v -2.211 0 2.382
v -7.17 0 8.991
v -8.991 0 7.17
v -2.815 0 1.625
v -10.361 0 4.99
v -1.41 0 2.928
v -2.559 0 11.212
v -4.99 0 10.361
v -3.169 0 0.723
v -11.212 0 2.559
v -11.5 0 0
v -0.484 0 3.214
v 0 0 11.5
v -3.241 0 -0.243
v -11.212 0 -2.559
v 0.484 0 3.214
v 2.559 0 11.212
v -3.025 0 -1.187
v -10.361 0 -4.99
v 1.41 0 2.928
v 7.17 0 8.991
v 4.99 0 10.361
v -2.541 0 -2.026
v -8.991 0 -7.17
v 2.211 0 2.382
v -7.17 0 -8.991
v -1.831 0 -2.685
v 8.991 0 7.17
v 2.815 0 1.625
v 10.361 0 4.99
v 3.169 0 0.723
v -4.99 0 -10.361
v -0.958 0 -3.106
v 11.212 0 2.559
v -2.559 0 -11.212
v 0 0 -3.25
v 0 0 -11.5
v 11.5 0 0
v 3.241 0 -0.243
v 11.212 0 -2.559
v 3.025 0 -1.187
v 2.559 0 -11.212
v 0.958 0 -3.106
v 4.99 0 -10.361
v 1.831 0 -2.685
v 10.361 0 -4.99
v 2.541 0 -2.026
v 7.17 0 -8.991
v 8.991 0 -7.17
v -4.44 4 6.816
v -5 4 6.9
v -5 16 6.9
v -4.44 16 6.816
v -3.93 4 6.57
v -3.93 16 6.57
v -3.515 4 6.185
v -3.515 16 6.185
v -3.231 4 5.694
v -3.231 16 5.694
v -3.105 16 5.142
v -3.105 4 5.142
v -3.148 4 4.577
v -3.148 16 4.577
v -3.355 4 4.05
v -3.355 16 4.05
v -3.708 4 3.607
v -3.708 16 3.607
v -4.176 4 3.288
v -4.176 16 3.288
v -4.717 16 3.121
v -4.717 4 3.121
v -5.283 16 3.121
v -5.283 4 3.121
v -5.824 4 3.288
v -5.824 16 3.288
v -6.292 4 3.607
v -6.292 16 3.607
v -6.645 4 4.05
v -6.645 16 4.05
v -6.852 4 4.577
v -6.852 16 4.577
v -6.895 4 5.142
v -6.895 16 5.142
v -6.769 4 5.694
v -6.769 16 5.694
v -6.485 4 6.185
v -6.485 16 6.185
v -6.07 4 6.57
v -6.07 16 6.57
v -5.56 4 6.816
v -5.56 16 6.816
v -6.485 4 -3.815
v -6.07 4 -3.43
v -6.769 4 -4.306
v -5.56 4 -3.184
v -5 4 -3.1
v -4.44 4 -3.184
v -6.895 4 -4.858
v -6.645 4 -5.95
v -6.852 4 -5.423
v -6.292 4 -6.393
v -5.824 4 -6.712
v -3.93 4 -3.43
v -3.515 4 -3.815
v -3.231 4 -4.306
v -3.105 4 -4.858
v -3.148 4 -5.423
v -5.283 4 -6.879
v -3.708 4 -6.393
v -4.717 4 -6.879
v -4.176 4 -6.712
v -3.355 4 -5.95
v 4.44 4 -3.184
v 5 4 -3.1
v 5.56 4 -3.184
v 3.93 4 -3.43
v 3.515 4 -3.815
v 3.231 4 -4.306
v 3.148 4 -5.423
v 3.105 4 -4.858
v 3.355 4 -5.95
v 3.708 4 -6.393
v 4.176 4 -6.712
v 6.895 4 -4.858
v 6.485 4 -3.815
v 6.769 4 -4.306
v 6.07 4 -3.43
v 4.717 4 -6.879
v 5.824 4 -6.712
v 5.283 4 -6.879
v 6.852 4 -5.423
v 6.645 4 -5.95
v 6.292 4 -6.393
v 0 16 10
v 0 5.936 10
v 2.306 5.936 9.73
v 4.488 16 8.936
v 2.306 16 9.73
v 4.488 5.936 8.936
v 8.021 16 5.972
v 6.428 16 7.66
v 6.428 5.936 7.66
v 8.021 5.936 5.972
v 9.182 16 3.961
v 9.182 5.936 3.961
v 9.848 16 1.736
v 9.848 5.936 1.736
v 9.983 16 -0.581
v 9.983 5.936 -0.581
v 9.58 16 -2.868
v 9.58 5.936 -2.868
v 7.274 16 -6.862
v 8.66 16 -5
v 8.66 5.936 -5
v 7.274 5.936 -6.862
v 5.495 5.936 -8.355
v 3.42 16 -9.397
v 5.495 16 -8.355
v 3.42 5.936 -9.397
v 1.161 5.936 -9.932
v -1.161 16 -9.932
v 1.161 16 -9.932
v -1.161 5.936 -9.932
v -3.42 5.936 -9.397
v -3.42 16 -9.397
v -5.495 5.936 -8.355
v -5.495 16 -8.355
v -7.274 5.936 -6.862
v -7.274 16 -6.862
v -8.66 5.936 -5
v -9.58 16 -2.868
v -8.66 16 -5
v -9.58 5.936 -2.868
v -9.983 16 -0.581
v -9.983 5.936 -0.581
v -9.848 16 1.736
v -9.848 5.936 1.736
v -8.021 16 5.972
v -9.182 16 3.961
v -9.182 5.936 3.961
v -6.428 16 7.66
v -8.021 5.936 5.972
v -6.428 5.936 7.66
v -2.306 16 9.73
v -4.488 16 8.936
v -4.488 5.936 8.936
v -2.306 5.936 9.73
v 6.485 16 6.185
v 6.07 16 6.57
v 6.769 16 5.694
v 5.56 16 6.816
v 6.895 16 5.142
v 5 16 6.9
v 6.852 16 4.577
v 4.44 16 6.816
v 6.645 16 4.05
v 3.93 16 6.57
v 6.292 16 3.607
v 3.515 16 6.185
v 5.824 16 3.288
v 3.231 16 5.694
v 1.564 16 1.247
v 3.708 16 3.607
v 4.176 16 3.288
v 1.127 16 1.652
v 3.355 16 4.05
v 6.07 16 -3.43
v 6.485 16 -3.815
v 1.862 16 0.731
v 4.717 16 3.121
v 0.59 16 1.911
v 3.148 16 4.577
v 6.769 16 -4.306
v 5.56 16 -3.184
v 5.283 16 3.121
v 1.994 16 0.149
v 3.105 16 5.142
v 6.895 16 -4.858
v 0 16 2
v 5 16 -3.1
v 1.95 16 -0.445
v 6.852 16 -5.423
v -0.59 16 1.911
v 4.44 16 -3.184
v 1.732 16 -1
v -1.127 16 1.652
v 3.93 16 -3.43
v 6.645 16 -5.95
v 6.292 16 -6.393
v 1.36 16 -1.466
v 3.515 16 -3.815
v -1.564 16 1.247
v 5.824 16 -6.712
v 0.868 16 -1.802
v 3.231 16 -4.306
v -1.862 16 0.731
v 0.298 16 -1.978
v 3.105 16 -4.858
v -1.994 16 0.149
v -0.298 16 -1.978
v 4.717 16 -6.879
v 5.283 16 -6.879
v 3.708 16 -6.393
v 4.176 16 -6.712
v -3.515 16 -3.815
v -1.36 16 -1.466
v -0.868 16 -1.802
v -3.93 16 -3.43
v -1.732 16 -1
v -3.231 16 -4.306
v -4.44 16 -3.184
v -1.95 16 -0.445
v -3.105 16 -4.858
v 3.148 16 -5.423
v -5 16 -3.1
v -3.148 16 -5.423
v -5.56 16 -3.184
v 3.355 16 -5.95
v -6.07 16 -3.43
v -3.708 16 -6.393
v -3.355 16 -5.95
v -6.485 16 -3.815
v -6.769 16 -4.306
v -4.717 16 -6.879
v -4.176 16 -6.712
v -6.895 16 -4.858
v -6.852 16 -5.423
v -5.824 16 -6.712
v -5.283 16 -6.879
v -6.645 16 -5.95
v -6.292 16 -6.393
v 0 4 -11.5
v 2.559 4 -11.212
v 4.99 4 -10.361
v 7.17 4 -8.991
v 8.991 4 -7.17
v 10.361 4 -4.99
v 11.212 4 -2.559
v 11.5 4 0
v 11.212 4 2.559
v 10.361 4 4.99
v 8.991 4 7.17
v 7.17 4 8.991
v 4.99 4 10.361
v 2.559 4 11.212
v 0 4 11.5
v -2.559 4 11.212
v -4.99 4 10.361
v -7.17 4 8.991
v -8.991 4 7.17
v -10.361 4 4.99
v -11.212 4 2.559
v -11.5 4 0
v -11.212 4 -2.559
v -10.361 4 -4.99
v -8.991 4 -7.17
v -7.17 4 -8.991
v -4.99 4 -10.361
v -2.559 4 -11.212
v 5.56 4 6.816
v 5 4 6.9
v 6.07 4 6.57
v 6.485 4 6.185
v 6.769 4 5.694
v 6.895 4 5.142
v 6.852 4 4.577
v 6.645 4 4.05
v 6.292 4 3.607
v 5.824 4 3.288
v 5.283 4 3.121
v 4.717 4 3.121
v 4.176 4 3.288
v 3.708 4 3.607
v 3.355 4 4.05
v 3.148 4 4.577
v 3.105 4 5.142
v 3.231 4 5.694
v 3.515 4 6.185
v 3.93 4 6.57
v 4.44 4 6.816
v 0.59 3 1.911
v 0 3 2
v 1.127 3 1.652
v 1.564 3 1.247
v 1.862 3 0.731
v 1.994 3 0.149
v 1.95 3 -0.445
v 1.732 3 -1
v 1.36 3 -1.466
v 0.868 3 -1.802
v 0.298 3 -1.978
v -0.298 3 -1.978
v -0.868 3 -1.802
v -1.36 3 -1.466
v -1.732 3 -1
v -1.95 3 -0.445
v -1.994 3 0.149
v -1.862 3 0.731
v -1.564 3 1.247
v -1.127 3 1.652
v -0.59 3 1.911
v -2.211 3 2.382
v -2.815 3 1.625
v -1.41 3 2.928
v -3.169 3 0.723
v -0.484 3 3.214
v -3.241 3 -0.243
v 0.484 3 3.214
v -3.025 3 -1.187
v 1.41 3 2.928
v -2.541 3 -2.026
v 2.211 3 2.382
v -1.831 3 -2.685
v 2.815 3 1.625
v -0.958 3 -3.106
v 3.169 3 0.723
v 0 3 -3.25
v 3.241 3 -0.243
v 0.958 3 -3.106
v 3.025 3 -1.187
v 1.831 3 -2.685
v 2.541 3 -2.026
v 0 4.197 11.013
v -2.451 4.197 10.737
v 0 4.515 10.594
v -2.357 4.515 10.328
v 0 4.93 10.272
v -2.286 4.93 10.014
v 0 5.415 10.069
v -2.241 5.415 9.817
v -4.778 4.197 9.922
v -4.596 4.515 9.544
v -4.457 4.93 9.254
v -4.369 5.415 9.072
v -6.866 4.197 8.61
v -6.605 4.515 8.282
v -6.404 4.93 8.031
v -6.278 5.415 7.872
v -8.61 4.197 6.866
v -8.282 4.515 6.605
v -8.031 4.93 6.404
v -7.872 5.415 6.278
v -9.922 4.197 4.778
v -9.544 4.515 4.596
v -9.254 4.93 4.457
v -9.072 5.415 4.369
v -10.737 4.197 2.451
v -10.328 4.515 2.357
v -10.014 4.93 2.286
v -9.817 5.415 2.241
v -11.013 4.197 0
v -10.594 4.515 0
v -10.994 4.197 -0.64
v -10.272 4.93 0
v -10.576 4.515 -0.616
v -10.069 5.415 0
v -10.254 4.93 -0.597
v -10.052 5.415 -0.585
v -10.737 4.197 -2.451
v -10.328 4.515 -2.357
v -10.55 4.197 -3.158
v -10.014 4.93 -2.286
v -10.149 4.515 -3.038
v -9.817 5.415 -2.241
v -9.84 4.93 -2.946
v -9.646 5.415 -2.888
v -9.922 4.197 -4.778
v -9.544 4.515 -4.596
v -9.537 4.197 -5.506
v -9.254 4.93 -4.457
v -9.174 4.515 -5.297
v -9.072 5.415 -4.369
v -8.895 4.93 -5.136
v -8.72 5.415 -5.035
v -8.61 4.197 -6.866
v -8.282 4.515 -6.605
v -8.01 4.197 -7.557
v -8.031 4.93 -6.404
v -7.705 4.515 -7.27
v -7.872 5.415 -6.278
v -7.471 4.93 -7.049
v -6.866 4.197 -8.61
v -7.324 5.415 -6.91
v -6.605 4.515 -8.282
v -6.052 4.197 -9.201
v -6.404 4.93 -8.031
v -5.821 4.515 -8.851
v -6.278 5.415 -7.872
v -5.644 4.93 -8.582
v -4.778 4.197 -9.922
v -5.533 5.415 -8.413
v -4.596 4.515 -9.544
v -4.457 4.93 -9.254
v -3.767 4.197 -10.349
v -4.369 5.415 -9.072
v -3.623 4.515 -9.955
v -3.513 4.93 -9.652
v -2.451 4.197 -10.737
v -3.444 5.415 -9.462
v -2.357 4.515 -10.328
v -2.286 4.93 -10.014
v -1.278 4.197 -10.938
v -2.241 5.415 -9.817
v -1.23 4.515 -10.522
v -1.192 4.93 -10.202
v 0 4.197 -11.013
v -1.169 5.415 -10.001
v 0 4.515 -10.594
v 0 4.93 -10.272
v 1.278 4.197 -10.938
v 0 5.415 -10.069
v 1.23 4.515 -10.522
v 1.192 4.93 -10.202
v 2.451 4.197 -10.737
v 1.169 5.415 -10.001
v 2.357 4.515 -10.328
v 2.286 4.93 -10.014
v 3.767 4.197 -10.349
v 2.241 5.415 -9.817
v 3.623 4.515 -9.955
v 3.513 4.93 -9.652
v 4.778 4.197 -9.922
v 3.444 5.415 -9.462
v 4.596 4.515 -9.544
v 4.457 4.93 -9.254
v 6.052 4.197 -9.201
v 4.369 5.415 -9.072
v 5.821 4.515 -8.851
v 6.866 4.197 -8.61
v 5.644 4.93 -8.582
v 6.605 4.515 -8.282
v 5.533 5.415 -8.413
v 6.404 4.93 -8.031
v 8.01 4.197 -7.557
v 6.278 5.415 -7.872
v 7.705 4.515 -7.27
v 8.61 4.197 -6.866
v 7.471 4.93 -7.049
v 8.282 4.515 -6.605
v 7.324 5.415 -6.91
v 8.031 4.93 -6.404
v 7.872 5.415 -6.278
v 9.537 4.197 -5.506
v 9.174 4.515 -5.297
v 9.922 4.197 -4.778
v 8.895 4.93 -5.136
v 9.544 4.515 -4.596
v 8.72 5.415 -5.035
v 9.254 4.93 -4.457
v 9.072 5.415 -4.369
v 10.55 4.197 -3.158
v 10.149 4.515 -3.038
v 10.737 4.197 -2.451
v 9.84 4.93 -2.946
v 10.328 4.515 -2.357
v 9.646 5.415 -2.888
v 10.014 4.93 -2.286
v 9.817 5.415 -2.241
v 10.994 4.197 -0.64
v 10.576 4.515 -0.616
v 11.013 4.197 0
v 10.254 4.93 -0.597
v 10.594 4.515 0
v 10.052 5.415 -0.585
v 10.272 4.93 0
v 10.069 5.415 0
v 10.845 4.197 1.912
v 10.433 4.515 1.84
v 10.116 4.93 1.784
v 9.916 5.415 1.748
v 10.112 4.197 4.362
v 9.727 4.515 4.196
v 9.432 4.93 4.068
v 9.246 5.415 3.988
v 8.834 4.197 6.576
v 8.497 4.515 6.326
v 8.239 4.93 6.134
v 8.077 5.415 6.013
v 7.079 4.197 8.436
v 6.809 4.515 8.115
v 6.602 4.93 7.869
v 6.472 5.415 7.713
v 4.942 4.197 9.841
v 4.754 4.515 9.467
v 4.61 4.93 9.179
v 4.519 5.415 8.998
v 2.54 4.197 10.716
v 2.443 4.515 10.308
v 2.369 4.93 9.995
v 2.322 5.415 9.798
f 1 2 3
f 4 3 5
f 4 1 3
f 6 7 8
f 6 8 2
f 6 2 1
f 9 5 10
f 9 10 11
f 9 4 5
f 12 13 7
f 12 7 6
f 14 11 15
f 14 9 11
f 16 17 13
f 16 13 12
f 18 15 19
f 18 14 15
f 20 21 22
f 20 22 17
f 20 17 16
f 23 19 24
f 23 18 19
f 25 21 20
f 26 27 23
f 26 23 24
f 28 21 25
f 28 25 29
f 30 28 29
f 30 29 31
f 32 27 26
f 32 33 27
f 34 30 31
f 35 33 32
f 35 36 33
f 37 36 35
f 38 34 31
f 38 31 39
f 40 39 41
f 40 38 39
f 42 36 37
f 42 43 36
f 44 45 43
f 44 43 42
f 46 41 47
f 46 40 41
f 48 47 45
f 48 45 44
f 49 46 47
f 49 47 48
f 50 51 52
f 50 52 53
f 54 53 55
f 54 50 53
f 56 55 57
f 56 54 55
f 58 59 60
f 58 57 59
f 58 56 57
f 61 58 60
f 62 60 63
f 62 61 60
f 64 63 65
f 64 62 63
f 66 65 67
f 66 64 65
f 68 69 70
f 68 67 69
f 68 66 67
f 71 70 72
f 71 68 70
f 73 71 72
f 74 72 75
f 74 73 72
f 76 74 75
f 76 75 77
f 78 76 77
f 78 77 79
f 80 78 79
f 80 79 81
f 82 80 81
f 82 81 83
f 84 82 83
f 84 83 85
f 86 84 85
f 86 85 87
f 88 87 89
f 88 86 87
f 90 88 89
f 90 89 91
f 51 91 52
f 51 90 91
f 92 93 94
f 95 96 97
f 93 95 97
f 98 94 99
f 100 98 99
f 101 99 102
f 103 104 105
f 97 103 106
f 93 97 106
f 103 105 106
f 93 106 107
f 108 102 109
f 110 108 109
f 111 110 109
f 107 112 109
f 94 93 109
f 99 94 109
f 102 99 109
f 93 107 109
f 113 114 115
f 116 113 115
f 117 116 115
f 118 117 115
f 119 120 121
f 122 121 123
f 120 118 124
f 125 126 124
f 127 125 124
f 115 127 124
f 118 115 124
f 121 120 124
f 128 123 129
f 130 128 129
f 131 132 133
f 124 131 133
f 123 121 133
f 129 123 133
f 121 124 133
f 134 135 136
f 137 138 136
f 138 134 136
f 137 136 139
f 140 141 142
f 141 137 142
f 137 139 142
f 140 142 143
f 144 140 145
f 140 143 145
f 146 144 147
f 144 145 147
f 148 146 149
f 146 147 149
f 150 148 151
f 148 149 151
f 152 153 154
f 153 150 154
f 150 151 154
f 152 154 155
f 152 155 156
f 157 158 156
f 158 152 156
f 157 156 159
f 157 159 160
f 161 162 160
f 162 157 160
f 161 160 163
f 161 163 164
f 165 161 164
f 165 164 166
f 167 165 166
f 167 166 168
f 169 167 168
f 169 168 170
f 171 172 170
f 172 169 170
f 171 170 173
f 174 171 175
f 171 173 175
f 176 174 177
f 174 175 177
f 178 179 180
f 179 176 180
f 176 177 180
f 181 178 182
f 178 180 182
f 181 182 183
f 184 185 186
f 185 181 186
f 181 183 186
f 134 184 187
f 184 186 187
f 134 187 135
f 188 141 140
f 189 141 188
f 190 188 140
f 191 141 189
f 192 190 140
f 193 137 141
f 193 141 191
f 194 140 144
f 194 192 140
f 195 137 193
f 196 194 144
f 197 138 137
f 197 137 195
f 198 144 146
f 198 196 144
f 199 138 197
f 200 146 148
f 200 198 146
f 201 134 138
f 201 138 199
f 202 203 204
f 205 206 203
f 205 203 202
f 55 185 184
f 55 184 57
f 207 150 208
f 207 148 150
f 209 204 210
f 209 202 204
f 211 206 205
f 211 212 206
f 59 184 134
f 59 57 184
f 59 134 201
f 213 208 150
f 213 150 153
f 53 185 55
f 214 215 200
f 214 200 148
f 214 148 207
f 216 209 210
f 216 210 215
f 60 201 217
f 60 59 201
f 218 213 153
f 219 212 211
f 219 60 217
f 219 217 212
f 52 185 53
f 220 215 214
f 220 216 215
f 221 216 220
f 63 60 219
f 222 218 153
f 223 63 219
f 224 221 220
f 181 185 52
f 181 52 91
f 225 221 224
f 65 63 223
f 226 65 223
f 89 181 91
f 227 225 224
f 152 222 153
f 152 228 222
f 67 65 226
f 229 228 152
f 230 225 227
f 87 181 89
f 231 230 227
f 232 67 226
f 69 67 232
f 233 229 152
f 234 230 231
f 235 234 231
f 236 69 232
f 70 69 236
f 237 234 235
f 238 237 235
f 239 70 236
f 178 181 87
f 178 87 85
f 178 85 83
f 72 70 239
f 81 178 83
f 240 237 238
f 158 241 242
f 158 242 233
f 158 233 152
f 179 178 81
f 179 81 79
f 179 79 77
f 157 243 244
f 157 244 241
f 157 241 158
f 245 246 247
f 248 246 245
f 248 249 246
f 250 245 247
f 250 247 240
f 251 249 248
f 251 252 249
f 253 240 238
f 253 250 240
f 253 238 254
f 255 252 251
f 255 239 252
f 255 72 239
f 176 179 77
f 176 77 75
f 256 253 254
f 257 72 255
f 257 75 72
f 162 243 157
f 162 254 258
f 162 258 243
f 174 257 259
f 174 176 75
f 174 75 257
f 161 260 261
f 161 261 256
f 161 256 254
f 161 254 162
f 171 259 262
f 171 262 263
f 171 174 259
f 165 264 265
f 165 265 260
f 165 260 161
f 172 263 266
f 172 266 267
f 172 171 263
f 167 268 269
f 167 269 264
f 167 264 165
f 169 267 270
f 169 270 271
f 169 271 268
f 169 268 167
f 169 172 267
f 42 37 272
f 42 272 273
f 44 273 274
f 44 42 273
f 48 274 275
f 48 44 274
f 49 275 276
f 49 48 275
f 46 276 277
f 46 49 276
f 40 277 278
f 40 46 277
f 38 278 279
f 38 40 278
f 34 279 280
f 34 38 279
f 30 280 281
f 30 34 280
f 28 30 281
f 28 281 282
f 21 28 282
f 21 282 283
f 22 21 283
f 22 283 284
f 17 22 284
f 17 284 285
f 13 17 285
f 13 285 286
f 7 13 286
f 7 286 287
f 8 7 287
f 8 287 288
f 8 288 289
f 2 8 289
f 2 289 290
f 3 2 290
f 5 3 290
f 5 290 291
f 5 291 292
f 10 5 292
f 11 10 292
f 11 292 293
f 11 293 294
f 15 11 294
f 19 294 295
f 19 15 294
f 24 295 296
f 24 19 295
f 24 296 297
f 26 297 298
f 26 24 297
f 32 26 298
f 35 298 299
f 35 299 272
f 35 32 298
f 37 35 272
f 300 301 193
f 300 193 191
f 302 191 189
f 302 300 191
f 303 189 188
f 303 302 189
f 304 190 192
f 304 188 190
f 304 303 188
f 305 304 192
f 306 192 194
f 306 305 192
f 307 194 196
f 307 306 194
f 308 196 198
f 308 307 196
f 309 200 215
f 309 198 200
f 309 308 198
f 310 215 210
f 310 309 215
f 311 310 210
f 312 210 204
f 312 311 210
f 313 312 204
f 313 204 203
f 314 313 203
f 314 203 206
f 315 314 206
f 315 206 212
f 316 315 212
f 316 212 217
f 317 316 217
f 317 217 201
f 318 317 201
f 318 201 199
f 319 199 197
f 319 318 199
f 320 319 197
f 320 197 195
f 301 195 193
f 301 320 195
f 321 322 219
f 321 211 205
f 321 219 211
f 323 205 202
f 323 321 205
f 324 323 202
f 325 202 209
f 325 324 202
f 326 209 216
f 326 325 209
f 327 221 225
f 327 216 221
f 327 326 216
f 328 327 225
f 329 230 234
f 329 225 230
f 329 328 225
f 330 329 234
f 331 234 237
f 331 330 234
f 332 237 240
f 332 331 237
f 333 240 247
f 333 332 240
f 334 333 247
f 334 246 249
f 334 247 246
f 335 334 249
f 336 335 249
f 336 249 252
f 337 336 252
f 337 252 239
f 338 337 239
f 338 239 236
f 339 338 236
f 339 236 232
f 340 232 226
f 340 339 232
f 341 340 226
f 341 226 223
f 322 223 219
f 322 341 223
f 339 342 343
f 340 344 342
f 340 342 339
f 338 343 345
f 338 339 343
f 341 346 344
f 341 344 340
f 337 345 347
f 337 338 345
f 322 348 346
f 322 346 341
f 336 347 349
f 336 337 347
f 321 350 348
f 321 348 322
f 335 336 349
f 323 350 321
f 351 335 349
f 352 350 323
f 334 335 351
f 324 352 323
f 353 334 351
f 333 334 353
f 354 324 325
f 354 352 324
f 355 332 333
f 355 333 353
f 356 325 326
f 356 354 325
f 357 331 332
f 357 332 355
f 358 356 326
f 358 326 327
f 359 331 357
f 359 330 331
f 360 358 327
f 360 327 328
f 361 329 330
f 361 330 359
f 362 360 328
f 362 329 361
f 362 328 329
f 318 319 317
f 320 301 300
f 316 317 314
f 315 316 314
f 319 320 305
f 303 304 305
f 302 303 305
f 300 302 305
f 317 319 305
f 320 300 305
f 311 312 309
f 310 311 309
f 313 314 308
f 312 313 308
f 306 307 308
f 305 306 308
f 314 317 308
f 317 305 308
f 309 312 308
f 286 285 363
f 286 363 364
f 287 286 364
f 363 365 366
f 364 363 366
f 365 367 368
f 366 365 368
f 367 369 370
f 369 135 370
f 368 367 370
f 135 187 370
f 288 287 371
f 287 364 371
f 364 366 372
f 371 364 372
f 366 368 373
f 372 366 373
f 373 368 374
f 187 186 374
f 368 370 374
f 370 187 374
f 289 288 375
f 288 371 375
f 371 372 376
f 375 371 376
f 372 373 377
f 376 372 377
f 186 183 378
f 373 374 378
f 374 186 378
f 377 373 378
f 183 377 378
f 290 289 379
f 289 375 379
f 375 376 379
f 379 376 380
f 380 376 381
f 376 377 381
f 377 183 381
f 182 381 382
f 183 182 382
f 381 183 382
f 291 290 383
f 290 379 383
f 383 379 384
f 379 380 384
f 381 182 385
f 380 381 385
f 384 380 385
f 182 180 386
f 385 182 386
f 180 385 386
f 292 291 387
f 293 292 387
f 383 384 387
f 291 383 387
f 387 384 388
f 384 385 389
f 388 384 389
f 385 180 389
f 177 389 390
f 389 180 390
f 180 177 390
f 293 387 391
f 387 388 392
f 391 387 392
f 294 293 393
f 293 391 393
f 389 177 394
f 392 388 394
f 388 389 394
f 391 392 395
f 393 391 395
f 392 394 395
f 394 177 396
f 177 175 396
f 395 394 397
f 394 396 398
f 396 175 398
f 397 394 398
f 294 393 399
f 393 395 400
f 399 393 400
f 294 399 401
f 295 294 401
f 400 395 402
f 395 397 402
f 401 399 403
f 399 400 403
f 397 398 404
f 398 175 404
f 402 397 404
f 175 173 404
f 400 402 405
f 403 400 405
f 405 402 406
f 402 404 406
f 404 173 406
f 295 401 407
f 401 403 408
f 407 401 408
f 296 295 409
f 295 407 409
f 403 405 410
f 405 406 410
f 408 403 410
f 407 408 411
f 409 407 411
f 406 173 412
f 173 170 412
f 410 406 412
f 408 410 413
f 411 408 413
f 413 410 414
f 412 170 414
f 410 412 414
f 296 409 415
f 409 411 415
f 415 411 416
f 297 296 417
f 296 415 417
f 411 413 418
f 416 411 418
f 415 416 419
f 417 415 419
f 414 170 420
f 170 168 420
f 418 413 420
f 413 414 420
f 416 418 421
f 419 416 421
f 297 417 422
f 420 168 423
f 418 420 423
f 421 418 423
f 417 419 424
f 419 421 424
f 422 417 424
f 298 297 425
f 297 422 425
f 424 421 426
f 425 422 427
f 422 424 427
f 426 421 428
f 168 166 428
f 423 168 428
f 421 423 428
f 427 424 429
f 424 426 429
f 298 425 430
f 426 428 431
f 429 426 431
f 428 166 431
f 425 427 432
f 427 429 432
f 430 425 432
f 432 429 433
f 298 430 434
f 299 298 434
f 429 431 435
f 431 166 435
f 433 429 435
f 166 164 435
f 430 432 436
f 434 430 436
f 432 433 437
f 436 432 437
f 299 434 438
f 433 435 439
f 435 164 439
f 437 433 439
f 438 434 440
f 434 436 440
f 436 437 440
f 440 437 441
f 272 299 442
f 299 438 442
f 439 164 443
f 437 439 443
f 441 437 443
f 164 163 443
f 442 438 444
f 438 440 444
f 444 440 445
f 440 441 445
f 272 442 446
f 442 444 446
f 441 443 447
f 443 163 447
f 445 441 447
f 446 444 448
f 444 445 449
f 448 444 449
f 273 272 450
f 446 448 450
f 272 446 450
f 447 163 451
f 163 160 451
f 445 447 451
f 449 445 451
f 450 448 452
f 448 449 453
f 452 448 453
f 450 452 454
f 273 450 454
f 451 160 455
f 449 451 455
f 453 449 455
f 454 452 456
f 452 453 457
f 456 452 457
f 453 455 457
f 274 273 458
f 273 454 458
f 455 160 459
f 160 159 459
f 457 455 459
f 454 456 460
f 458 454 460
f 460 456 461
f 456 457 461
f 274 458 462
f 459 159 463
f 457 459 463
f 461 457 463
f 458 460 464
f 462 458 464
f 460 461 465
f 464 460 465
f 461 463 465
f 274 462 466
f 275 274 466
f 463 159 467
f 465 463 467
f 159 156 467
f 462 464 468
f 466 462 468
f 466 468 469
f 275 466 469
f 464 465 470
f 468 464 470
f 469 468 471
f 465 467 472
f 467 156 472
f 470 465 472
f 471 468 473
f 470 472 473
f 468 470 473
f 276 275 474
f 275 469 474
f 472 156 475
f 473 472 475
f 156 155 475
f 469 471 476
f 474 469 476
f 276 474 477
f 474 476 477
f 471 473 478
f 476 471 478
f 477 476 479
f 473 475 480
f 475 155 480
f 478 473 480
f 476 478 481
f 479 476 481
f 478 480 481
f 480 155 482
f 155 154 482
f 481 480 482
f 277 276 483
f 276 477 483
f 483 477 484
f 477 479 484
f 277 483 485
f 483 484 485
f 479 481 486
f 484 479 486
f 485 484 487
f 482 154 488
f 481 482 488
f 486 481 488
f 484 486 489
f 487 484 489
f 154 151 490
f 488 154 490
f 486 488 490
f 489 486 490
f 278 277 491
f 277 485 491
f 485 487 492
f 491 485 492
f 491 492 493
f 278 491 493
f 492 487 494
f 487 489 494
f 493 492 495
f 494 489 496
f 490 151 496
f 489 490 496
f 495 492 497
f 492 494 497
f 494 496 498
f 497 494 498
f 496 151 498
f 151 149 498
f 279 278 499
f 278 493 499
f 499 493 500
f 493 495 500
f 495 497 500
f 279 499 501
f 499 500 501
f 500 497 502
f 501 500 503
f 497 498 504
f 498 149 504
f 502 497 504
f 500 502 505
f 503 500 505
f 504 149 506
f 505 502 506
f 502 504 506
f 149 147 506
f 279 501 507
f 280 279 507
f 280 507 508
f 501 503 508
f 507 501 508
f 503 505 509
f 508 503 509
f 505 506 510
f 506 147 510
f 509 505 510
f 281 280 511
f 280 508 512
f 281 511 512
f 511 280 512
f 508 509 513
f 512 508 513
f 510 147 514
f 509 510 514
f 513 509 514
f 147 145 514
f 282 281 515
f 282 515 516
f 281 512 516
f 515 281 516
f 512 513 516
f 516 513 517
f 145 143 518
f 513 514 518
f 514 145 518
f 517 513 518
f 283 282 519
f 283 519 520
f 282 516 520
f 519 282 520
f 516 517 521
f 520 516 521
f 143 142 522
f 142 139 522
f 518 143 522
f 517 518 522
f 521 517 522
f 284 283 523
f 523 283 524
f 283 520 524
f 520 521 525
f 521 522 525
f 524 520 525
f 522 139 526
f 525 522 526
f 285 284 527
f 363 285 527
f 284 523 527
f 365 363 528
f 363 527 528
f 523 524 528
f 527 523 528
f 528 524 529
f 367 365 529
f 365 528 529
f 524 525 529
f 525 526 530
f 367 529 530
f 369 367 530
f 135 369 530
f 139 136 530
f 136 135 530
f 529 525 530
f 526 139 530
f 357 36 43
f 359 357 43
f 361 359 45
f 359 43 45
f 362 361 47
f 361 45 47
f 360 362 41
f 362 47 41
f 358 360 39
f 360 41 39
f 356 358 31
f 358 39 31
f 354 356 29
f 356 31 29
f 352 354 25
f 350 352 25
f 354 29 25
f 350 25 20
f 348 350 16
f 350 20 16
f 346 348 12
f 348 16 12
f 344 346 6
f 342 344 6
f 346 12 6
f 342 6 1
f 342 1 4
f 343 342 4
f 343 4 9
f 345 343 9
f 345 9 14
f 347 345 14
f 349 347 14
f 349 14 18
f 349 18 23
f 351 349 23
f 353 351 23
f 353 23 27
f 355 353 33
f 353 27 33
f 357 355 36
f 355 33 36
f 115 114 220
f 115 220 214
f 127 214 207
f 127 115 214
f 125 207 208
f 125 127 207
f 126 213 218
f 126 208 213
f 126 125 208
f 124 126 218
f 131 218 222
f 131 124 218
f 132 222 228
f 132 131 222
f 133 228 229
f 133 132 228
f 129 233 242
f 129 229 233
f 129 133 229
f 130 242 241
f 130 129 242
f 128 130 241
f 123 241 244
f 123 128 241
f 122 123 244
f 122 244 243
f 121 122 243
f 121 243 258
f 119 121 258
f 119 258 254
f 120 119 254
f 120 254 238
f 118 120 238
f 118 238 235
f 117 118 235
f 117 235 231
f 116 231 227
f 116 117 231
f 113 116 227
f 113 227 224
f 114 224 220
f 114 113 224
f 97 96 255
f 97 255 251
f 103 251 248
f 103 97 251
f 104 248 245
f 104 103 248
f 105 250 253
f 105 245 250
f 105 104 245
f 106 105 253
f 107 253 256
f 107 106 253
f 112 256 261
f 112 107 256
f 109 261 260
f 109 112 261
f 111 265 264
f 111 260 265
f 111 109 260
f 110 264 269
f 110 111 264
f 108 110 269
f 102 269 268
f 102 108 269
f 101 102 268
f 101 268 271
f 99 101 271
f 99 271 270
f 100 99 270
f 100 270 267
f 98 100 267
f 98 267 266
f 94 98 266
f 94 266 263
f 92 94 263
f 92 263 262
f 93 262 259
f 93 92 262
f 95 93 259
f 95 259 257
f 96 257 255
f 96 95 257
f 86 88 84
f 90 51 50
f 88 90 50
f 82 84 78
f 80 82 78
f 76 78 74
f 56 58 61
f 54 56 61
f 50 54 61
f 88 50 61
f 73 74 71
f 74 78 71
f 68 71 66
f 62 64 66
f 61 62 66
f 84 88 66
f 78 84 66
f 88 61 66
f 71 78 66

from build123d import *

# Parameters (mm, degrees)
SKETCH_1_R          = 10
SKETCH_1_R_2        = 1.9
SKETCH_1_R_3        = 2
EXTRUDE_6_DEPTH     = 20
SKETCH_12_R         = 11.5
SKETCH_12_R_2       = 3.1
EXTRUDE_8_DEPTH     = 4
SKETCH_13_R         = 3
CUT_EXTRUDE_7_DEPTH = 2
FILLET_3_R          = 2
CUT_EXTRUDE_START   = -4
SKETCH_14_R         = 10
CUT_EXTRUDE_8_DEPTH = 4
SKETCH_15_R         = 3.25
CUT_EXTRUDE_9_DEPTH = 3


with BuildPart() as part:
    # 草图1 → 凸台-拉伸6 (new body)
    with BuildSketch(Plane(origin=(0, 0, 0), x_dir=(1, 0, 0), z_dir=(0, 1, 0))):
        with Locations(Location((0, 0, 0), (0, 0, 270))):
            Circle(SKETCH_1_R)
        with Locations(Location((-5, 5, 0), (0, 0, 270))):
            Circle(SKETCH_1_R_2, mode=Mode.SUBTRACT)
        with Locations(Location((5, 5, 0), (0, 0, 270))):
            Circle(SKETCH_1_R_2, mode=Mode.SUBTRACT)
        with Locations(Location((5, -5, 0), (0, 0, 270))):
            Circle(SKETCH_1_R_2, mode=Mode.SUBTRACT)
        with Locations(Location((-5, -5, 0), (0, 0, 270))):
            Circle(SKETCH_1_R_2, mode=Mode.SUBTRACT)
        with Locations(Location((0, 0, 0), (0, 0, 270))):
            Circle(SKETCH_1_R_3, mode=Mode.SUBTRACT)
    extrude(amount=EXTRUDE_6_DEPTH)

    # 草图12 → 凸台-拉伸8 (add)
    with BuildSketch(Plane.XZ):
        with Locations(Location((0, 0, 0), (0, 0, 270))):
            Circle(SKETCH_12_R)
        Circle(SKETCH_12_R_2, mode=Mode.SUBTRACT)
    extrude(amount=-EXTRUDE_8_DEPTH)

    # 草图13 → 切除-拉伸7 (cut)
    with BuildSketch(Plane.XZ):
        with Locations(Location((0, 0, 0), (0, 0, 270))):
            Circle(SKETCH_13_R)
    extrude(amount=-CUT_EXTRUDE_7_DEPTH, mode=Mode.SUBTRACT)

    # 圆角3
    # the kernel refuses this fillet: 2 mm, written as the material it adds along each edge
    with BuildSketch(Plane(origin=(0, 4, 0), x_dir=(0, 0, 1), z_dir=(1, 0, 0))) as fillet_3_piece_1:
        with BuildLine():
            CenterArc((12, -1.936491673), FILLET_3_R, 104.477512186, 75.522487814)
            Line((10, -1.936491673), (9.96, -1.936491673))
            Line((9.96, -1.936491673), (9.96, 0))
            Line((9.96, 0), (10, 0.04))
            ThreePointArc((10, 0.04), (10.75, 0.04), (11.49, 0.038729833))
            Line((11.49, 0.038729833), (11.5, 0))
        make_face()
    revolve(axis=Axis((0, 4, 0), (0, -1, 0)))

    # 草图14 → 切除-拉伸8 (cut)
    with BuildSketch(Plane(origin=(0, 20, 0), x_dir=(1, 0, 0), z_dir=(0, 1, 0)).offset(CUT_EXTRUDE_START)):
        with Locations(Location((0, 0, 0), (0, 0, 90))):
            Circle(SKETCH_14_R)
    extrude(amount=CUT_EXTRUDE_8_DEPTH, mode=Mode.SUBTRACT)

    # 草图15 → 切除-拉伸9 (cut)
    with BuildSketch(Plane.XZ):
        with Locations(Location((0, 0, 0), (0, 0, 270))):
            Circle(SKETCH_15_R)
    extrude(amount=-CUT_EXTRUDE_9_DEPTH, mode=Mode.SUBTRACT)


solid = part.part
